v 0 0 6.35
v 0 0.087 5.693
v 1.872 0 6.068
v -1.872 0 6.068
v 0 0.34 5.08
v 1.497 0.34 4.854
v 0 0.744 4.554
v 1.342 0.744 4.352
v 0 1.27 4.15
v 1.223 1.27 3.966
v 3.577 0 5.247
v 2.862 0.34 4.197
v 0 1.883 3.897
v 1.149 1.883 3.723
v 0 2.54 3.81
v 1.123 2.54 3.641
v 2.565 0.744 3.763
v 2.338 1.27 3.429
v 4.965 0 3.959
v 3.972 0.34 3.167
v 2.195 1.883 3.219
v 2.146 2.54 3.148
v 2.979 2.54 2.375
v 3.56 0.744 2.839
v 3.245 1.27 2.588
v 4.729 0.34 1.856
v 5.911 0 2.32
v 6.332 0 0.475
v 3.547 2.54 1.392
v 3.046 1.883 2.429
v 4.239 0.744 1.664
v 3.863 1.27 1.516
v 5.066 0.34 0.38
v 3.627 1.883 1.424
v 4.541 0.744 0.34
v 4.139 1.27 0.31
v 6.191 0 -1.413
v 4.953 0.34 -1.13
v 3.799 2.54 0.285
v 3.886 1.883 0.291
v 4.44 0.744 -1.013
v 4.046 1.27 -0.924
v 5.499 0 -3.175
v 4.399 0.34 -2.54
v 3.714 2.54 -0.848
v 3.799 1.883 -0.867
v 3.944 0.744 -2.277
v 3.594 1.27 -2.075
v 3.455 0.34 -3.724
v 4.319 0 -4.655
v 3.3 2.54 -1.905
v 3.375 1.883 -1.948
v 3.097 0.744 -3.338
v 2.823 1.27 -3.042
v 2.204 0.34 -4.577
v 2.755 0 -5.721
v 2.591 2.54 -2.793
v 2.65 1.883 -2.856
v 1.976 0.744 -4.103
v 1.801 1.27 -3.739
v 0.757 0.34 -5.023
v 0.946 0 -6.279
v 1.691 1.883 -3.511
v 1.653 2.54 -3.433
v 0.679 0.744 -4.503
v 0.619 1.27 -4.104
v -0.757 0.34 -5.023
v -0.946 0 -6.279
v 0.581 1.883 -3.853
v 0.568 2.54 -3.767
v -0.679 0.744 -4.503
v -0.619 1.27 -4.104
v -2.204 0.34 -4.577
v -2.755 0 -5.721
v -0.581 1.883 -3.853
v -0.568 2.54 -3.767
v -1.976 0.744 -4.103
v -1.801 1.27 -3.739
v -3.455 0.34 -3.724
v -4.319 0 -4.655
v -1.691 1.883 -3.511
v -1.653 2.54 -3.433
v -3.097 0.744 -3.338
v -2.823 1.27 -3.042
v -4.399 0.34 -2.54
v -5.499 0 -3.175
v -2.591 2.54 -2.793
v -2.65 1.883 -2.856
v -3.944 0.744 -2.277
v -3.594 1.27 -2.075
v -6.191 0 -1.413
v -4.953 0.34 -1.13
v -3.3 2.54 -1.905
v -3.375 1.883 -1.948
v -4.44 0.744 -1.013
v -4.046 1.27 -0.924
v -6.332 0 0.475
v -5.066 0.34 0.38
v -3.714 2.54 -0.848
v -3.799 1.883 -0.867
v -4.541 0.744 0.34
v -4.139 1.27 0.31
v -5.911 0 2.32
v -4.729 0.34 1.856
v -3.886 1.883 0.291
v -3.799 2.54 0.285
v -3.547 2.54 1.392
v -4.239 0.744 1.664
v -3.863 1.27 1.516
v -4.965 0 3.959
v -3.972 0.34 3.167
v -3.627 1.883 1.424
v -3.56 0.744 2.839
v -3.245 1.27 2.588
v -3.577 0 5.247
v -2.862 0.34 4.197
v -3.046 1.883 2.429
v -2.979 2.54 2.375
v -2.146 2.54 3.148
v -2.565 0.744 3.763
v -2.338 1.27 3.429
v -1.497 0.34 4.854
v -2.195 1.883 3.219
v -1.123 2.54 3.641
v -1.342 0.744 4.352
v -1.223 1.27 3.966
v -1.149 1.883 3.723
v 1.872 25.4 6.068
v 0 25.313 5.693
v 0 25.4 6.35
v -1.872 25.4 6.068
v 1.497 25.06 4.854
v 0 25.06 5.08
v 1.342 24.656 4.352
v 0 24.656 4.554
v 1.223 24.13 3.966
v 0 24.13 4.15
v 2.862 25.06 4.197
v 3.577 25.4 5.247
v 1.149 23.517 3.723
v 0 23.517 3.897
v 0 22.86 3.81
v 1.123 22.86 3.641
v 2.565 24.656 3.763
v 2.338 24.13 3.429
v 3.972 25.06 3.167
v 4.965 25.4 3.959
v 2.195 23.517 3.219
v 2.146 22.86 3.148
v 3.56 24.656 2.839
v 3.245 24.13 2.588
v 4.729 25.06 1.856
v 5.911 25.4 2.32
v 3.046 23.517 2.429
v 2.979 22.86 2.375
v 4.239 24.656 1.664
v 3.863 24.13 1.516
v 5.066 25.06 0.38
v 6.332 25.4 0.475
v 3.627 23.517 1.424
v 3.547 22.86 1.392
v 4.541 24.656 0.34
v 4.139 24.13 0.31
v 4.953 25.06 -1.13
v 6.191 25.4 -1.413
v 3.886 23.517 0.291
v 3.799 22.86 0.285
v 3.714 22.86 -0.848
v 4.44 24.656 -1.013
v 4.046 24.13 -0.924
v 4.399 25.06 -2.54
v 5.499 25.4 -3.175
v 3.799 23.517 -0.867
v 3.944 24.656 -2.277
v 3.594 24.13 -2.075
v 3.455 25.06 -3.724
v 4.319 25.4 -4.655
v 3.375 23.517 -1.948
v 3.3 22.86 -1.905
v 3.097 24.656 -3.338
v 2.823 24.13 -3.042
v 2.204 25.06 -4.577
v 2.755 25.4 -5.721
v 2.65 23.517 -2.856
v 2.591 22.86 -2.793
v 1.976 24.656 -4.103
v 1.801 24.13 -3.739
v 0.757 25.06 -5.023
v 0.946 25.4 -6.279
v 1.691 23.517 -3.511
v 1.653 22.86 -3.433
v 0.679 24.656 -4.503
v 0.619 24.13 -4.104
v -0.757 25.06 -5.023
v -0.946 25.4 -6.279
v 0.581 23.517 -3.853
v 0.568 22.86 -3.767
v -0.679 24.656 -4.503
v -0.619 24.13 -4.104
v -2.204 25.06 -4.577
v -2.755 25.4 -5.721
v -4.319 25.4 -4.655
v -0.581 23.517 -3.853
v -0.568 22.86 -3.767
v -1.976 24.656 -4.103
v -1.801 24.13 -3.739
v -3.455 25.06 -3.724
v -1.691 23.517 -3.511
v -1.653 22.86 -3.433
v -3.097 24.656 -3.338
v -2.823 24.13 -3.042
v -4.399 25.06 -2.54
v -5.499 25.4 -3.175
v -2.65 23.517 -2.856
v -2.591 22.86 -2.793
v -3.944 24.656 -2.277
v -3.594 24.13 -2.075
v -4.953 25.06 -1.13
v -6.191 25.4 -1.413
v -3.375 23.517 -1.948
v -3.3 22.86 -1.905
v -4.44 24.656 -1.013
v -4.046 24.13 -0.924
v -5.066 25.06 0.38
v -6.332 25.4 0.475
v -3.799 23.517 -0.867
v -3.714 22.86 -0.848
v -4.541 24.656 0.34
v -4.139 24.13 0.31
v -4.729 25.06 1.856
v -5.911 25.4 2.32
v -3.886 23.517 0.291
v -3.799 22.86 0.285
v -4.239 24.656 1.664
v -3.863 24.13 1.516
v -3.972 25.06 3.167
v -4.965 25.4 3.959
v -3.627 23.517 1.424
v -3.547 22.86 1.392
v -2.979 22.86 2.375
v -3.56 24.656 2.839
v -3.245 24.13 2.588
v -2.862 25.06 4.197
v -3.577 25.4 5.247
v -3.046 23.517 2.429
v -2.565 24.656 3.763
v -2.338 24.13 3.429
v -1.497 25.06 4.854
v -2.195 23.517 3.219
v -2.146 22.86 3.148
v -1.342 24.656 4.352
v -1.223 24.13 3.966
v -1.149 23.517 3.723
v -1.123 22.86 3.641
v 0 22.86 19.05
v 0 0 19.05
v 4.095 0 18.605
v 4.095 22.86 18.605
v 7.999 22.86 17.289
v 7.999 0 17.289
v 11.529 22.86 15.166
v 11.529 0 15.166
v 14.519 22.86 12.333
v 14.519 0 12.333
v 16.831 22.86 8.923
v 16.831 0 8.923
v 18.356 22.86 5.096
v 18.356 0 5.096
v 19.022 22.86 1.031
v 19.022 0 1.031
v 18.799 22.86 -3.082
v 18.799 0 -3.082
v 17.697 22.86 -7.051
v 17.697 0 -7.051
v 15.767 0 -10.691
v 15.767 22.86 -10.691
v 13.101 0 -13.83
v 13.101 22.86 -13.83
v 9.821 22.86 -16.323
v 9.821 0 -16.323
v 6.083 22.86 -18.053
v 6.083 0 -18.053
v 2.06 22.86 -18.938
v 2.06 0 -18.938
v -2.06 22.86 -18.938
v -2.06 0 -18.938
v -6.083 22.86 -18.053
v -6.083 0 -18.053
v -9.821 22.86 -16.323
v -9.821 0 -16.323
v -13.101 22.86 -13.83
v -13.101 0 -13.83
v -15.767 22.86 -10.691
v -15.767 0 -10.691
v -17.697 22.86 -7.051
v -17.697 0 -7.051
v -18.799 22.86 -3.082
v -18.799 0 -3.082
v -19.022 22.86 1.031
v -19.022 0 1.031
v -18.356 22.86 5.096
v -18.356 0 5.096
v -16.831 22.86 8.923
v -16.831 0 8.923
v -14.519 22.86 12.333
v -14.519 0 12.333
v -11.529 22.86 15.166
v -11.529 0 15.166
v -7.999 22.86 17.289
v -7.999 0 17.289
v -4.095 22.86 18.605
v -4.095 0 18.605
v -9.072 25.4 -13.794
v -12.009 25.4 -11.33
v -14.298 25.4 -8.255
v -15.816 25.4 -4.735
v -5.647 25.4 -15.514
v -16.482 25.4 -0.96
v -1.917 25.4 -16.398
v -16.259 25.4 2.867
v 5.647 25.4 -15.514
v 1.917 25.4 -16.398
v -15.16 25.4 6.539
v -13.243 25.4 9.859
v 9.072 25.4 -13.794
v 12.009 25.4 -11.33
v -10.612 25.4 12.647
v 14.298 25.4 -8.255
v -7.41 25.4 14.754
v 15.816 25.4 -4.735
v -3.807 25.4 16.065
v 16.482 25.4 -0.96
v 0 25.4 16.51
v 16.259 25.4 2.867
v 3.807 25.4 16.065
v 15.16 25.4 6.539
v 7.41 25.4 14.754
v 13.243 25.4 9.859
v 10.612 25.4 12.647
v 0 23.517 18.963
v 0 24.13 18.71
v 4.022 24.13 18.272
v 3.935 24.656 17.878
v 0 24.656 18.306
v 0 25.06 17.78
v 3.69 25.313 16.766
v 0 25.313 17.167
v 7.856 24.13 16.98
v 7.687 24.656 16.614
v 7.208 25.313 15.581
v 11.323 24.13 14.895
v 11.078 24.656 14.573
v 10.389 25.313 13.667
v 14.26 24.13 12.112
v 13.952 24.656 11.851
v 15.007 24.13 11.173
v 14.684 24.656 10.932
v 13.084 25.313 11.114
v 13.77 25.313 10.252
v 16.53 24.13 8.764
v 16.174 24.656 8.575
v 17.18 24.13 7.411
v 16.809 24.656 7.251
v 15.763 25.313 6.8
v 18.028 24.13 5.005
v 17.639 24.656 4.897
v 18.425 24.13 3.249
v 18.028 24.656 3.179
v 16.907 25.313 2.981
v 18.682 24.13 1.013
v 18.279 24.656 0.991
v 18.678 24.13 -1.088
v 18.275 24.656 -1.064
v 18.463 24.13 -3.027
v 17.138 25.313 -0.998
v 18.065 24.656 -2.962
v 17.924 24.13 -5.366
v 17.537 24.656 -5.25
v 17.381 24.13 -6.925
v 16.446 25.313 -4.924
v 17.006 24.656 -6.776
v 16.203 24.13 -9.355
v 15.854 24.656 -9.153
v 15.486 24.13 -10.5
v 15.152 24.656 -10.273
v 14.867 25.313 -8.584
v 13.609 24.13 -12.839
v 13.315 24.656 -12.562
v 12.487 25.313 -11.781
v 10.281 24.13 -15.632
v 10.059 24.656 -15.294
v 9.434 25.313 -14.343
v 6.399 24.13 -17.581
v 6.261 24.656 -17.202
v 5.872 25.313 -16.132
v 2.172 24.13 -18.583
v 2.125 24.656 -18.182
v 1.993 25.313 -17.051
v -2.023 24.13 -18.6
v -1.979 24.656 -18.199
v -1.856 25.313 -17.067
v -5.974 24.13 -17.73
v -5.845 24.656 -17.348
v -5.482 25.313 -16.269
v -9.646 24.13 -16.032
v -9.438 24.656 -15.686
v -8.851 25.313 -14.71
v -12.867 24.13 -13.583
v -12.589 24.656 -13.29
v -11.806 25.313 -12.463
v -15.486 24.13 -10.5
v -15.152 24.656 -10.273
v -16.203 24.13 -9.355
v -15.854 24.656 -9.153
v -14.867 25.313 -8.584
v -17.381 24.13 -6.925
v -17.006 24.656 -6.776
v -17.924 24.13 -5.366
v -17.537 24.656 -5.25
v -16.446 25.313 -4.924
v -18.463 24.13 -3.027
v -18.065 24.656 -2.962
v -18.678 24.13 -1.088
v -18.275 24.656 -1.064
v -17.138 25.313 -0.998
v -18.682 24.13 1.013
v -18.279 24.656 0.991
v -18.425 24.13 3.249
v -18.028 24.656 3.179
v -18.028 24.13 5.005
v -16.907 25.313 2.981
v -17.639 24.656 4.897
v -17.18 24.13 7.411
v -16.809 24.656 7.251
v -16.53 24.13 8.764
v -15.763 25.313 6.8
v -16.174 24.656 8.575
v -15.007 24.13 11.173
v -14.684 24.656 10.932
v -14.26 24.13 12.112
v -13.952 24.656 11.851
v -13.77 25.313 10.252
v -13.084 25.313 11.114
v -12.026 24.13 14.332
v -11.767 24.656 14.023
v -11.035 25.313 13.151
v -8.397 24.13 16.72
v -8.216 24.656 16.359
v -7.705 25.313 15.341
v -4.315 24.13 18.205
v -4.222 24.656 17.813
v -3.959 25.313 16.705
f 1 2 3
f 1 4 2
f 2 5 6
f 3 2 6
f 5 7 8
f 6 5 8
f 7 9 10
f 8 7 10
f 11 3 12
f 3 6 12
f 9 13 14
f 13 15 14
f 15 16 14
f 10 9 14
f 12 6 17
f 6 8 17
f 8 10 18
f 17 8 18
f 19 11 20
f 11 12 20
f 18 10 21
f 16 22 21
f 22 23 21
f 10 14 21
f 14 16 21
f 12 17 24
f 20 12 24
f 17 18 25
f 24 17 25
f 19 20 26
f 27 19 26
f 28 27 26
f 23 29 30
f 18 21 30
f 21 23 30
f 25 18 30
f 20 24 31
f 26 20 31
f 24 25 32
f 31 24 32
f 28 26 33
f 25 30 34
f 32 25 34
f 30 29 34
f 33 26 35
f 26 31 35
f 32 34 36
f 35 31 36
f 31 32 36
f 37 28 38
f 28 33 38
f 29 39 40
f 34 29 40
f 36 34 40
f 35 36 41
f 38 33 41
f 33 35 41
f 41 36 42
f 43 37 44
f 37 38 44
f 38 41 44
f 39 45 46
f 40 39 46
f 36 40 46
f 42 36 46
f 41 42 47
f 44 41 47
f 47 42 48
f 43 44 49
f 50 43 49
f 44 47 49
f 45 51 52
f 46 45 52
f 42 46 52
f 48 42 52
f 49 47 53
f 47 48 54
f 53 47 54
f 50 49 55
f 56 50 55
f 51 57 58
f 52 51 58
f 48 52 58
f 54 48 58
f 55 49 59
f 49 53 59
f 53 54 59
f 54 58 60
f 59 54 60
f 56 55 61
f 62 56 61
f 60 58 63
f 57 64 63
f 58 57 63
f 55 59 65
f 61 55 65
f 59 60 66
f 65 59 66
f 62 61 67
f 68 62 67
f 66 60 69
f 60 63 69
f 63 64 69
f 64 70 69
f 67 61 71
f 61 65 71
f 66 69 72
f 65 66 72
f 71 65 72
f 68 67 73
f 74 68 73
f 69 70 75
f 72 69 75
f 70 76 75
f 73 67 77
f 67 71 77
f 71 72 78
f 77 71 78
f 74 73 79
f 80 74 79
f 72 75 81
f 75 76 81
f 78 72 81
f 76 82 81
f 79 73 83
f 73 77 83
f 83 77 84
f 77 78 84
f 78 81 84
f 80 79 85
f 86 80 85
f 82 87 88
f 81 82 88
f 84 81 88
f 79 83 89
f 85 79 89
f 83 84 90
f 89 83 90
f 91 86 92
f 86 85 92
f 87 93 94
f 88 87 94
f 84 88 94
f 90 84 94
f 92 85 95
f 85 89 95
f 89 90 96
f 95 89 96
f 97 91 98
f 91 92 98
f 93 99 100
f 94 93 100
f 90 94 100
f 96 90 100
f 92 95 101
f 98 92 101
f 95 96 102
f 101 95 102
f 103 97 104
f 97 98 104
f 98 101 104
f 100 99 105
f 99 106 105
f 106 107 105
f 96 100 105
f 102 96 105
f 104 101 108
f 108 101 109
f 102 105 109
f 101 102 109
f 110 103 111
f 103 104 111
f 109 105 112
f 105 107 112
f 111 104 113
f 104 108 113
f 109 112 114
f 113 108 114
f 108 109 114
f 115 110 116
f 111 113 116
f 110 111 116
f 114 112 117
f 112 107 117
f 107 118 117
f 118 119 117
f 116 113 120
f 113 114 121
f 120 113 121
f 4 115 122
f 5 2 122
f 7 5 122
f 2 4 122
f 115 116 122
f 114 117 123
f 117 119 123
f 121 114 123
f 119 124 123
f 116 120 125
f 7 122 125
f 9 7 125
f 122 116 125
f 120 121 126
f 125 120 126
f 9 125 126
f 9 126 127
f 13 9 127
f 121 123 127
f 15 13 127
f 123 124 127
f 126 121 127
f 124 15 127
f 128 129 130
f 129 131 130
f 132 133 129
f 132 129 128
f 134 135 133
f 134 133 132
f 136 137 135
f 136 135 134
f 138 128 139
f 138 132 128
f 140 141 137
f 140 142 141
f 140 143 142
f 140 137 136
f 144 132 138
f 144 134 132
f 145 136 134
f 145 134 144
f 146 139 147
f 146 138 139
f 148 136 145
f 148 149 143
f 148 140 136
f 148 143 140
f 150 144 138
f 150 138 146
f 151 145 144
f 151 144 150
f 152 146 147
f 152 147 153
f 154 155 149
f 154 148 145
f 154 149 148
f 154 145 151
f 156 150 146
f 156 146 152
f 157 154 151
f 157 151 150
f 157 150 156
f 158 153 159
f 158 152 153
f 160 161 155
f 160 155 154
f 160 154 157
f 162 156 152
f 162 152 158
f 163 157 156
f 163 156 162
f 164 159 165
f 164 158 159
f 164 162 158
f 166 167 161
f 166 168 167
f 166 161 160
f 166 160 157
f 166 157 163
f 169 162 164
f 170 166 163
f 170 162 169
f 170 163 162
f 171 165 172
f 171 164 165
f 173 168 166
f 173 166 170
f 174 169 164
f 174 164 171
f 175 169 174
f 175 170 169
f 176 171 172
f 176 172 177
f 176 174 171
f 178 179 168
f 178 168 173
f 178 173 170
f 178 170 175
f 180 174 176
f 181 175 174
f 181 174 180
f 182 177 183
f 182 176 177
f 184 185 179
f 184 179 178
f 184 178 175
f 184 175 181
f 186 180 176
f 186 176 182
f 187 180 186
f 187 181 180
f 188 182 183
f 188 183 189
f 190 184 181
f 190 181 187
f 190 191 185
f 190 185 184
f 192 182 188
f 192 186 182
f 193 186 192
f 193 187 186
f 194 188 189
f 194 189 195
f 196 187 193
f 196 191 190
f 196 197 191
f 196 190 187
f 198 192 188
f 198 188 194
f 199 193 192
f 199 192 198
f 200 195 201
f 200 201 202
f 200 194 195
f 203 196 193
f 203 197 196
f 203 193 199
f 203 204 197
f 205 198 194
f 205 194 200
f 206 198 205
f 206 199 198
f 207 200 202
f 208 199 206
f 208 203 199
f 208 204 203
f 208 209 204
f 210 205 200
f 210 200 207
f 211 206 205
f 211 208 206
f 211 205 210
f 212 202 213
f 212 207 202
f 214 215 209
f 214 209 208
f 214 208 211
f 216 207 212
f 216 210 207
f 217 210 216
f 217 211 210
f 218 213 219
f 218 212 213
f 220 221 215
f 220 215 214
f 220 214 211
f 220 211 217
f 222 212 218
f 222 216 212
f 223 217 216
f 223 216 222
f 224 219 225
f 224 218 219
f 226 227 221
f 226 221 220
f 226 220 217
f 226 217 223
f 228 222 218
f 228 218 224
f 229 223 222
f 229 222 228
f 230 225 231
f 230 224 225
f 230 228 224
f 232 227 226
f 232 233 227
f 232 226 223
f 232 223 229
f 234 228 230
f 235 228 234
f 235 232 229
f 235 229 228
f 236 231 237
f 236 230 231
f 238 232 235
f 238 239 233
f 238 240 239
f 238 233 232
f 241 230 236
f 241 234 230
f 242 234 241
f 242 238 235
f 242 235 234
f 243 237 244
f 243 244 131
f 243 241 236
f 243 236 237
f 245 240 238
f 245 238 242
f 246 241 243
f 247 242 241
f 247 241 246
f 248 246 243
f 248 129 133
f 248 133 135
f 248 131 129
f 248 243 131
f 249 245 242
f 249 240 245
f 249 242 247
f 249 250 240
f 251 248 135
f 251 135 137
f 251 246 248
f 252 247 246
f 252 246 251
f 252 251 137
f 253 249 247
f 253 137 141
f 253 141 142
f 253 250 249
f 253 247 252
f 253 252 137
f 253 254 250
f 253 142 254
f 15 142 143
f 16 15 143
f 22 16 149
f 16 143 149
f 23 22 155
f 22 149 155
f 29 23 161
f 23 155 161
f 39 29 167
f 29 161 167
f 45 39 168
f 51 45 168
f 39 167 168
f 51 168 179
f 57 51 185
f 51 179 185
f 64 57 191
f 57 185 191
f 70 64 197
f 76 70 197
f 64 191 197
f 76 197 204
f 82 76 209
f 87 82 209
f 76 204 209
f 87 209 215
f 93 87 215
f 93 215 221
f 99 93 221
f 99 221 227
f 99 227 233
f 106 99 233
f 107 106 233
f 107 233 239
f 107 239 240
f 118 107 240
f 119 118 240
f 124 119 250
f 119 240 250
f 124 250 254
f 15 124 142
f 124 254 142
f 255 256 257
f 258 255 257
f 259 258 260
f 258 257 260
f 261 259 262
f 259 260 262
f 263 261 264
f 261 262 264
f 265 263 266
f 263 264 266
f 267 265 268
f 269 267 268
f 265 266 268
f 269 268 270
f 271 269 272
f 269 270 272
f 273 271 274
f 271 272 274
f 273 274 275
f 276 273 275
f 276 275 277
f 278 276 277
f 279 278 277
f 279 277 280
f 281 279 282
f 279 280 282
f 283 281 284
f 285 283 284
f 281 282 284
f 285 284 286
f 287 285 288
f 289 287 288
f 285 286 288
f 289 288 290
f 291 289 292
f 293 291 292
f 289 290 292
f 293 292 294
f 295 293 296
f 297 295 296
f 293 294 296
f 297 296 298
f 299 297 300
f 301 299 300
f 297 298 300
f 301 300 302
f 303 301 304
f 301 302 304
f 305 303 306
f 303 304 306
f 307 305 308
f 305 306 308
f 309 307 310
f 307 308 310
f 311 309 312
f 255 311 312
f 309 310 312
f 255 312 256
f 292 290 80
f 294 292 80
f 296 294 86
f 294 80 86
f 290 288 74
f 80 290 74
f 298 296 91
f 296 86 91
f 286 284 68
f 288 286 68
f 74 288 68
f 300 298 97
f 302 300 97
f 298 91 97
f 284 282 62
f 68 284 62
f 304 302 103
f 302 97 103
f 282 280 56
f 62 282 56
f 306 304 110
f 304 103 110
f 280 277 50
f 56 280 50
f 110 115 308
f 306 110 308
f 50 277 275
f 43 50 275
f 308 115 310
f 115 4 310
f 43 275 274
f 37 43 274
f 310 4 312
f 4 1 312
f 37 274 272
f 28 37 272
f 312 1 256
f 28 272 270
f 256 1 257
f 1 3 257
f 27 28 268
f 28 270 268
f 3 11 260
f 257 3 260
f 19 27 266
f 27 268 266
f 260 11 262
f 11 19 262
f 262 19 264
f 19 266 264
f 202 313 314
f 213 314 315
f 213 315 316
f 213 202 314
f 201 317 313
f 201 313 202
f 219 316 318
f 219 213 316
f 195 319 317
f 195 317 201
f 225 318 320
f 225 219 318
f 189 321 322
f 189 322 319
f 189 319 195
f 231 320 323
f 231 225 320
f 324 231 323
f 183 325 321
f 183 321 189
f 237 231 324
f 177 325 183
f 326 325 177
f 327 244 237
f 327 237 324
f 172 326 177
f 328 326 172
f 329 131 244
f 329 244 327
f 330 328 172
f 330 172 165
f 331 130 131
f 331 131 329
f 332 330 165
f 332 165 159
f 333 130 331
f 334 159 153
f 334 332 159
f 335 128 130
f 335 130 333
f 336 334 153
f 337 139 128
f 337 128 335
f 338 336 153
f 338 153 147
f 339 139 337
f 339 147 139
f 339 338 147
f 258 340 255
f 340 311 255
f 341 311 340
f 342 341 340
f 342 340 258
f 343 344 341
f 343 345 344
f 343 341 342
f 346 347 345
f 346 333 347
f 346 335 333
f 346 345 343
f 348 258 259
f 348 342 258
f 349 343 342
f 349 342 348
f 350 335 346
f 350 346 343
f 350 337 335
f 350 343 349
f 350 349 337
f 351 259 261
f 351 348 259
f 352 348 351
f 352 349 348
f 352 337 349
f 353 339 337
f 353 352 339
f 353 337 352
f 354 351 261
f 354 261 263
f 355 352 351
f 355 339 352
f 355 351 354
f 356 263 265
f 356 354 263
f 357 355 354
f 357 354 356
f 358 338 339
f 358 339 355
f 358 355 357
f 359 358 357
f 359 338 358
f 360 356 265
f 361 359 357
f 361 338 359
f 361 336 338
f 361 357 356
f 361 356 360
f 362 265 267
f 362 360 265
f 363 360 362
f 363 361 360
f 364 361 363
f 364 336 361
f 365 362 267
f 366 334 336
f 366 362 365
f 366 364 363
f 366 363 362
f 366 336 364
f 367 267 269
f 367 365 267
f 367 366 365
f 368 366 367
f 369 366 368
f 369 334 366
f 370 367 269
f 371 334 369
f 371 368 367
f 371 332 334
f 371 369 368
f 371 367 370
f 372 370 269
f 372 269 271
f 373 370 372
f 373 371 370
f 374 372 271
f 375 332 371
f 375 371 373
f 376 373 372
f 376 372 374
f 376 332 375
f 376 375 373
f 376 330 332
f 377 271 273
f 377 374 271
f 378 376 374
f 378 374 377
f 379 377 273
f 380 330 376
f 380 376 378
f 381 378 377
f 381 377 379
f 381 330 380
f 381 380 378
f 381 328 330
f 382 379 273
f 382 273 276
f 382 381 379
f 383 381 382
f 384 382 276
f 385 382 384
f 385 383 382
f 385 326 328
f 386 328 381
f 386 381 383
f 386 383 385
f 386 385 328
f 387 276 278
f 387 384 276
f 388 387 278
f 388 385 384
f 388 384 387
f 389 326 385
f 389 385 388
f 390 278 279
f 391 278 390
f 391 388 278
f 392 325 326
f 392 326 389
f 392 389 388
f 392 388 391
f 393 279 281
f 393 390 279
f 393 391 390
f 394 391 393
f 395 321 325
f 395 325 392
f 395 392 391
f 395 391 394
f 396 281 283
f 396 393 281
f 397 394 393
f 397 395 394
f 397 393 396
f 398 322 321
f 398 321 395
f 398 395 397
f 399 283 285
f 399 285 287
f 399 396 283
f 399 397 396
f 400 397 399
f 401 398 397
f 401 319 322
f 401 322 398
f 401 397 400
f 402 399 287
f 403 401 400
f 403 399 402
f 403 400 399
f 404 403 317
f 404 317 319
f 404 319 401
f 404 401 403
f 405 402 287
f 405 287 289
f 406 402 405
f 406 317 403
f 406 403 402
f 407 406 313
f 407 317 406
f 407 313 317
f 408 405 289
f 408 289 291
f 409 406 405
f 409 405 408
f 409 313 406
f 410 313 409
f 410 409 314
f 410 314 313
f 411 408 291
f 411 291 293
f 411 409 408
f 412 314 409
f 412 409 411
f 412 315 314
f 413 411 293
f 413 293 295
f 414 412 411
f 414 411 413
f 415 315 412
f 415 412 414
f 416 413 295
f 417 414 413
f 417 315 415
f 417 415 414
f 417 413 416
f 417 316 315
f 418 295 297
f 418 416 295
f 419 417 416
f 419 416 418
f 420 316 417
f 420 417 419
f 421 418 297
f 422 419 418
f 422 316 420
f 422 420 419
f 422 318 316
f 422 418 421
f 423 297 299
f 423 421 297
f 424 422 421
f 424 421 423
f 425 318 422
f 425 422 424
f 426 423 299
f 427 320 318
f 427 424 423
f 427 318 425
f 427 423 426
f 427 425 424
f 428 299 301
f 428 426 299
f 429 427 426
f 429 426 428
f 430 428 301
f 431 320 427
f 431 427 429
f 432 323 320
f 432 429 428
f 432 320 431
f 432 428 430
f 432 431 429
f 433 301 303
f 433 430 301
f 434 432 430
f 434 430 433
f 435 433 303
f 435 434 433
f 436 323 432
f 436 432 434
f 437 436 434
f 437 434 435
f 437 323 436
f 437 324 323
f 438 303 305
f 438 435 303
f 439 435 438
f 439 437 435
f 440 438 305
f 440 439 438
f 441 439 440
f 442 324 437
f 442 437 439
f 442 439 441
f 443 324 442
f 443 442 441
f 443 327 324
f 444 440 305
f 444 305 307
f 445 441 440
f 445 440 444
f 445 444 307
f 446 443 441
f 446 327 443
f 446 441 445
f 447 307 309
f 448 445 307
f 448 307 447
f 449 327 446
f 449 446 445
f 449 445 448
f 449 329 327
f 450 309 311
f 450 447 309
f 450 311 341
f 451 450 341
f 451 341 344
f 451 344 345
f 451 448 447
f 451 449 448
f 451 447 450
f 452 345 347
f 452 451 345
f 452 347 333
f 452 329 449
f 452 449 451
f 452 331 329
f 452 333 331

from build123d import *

# Parameters (mm, degrees)
SKETCH3_R           = 19.05
BOSS_EXTRUDE1_DEPTH = 25.4
SKETCH4_R           = 3.81
CUT_EXTRUDE1_DEPTH  = 25.4
FILLET1_R           = 2.54


with BuildPart() as part:
    # Sketch3 → Boss-Extrude1 (new body)
    with BuildSketch(Plane(origin=(0, 0, 0), x_dir=(1, 0, 0), z_dir=(0, 1, 0))):
        with Locations(Location((0, 0, 0), (0, 0, 270))):
            Circle(SKETCH3_R)
    extrude(amount=BOSS_EXTRUDE1_DEPTH)

    # Sketch4 → Cut-Extrude1 (cut)
    with BuildSketch(Plane(origin=(0, 25.4, 0), x_dir=(1, 0, 0), z_dir=(0, 1, 0))):
        with Locations(Location((0, 0, 0), (0, 0, 270))):
            Circle(SKETCH4_R)
    extrude(amount=-CUT_EXTRUDE1_DEPTH, mode=Mode.SUBTRACT)

    # Fillet1
    fillet1_edges = [part.edges().sort_by_distance(p)[0] for p in [
        (0, 25.4, -19.05),
        (0, 0, -3.81),
        (0, 25.4, -3.81),
    ]]
    fillet(fillet1_edges, radius=FILLET1_R)


solid = part.part
